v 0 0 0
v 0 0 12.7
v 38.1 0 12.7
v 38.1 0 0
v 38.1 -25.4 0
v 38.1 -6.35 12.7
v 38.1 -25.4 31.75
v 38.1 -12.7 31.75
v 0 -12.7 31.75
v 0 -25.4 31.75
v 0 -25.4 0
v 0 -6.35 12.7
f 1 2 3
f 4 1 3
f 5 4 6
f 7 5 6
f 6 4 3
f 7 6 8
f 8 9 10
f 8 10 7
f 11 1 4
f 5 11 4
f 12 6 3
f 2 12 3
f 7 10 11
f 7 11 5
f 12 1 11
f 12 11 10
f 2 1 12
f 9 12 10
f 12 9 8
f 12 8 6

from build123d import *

# Parameters (mm, degrees)
F0_W     = 38.1
F0_H     = 31.75
F1_DEPTH = 25.4
F3_DEPTH = 50.8


with BuildPart() as f1:
    # F0 (on Front) → F1 (new body)
    with BuildSketch(Plane.XZ):
        with Locations((19.05, 15.875)):
            Rectangle(F0_W, F0_H)
    extrude(amount=F1_DEPTH)

    # F2 (on face) → F3 (cut)
    with BuildSketch(Plane.YZ.offset(38.1)):
        Polygon((0, 31.75), (-12.7, 31.75), (-6.35, 12.7), (0, 12.7), align=None)
    extrude(amount=-F3_DEPTH, mode=Mode.SUBTRACT)


solid = f1.part
